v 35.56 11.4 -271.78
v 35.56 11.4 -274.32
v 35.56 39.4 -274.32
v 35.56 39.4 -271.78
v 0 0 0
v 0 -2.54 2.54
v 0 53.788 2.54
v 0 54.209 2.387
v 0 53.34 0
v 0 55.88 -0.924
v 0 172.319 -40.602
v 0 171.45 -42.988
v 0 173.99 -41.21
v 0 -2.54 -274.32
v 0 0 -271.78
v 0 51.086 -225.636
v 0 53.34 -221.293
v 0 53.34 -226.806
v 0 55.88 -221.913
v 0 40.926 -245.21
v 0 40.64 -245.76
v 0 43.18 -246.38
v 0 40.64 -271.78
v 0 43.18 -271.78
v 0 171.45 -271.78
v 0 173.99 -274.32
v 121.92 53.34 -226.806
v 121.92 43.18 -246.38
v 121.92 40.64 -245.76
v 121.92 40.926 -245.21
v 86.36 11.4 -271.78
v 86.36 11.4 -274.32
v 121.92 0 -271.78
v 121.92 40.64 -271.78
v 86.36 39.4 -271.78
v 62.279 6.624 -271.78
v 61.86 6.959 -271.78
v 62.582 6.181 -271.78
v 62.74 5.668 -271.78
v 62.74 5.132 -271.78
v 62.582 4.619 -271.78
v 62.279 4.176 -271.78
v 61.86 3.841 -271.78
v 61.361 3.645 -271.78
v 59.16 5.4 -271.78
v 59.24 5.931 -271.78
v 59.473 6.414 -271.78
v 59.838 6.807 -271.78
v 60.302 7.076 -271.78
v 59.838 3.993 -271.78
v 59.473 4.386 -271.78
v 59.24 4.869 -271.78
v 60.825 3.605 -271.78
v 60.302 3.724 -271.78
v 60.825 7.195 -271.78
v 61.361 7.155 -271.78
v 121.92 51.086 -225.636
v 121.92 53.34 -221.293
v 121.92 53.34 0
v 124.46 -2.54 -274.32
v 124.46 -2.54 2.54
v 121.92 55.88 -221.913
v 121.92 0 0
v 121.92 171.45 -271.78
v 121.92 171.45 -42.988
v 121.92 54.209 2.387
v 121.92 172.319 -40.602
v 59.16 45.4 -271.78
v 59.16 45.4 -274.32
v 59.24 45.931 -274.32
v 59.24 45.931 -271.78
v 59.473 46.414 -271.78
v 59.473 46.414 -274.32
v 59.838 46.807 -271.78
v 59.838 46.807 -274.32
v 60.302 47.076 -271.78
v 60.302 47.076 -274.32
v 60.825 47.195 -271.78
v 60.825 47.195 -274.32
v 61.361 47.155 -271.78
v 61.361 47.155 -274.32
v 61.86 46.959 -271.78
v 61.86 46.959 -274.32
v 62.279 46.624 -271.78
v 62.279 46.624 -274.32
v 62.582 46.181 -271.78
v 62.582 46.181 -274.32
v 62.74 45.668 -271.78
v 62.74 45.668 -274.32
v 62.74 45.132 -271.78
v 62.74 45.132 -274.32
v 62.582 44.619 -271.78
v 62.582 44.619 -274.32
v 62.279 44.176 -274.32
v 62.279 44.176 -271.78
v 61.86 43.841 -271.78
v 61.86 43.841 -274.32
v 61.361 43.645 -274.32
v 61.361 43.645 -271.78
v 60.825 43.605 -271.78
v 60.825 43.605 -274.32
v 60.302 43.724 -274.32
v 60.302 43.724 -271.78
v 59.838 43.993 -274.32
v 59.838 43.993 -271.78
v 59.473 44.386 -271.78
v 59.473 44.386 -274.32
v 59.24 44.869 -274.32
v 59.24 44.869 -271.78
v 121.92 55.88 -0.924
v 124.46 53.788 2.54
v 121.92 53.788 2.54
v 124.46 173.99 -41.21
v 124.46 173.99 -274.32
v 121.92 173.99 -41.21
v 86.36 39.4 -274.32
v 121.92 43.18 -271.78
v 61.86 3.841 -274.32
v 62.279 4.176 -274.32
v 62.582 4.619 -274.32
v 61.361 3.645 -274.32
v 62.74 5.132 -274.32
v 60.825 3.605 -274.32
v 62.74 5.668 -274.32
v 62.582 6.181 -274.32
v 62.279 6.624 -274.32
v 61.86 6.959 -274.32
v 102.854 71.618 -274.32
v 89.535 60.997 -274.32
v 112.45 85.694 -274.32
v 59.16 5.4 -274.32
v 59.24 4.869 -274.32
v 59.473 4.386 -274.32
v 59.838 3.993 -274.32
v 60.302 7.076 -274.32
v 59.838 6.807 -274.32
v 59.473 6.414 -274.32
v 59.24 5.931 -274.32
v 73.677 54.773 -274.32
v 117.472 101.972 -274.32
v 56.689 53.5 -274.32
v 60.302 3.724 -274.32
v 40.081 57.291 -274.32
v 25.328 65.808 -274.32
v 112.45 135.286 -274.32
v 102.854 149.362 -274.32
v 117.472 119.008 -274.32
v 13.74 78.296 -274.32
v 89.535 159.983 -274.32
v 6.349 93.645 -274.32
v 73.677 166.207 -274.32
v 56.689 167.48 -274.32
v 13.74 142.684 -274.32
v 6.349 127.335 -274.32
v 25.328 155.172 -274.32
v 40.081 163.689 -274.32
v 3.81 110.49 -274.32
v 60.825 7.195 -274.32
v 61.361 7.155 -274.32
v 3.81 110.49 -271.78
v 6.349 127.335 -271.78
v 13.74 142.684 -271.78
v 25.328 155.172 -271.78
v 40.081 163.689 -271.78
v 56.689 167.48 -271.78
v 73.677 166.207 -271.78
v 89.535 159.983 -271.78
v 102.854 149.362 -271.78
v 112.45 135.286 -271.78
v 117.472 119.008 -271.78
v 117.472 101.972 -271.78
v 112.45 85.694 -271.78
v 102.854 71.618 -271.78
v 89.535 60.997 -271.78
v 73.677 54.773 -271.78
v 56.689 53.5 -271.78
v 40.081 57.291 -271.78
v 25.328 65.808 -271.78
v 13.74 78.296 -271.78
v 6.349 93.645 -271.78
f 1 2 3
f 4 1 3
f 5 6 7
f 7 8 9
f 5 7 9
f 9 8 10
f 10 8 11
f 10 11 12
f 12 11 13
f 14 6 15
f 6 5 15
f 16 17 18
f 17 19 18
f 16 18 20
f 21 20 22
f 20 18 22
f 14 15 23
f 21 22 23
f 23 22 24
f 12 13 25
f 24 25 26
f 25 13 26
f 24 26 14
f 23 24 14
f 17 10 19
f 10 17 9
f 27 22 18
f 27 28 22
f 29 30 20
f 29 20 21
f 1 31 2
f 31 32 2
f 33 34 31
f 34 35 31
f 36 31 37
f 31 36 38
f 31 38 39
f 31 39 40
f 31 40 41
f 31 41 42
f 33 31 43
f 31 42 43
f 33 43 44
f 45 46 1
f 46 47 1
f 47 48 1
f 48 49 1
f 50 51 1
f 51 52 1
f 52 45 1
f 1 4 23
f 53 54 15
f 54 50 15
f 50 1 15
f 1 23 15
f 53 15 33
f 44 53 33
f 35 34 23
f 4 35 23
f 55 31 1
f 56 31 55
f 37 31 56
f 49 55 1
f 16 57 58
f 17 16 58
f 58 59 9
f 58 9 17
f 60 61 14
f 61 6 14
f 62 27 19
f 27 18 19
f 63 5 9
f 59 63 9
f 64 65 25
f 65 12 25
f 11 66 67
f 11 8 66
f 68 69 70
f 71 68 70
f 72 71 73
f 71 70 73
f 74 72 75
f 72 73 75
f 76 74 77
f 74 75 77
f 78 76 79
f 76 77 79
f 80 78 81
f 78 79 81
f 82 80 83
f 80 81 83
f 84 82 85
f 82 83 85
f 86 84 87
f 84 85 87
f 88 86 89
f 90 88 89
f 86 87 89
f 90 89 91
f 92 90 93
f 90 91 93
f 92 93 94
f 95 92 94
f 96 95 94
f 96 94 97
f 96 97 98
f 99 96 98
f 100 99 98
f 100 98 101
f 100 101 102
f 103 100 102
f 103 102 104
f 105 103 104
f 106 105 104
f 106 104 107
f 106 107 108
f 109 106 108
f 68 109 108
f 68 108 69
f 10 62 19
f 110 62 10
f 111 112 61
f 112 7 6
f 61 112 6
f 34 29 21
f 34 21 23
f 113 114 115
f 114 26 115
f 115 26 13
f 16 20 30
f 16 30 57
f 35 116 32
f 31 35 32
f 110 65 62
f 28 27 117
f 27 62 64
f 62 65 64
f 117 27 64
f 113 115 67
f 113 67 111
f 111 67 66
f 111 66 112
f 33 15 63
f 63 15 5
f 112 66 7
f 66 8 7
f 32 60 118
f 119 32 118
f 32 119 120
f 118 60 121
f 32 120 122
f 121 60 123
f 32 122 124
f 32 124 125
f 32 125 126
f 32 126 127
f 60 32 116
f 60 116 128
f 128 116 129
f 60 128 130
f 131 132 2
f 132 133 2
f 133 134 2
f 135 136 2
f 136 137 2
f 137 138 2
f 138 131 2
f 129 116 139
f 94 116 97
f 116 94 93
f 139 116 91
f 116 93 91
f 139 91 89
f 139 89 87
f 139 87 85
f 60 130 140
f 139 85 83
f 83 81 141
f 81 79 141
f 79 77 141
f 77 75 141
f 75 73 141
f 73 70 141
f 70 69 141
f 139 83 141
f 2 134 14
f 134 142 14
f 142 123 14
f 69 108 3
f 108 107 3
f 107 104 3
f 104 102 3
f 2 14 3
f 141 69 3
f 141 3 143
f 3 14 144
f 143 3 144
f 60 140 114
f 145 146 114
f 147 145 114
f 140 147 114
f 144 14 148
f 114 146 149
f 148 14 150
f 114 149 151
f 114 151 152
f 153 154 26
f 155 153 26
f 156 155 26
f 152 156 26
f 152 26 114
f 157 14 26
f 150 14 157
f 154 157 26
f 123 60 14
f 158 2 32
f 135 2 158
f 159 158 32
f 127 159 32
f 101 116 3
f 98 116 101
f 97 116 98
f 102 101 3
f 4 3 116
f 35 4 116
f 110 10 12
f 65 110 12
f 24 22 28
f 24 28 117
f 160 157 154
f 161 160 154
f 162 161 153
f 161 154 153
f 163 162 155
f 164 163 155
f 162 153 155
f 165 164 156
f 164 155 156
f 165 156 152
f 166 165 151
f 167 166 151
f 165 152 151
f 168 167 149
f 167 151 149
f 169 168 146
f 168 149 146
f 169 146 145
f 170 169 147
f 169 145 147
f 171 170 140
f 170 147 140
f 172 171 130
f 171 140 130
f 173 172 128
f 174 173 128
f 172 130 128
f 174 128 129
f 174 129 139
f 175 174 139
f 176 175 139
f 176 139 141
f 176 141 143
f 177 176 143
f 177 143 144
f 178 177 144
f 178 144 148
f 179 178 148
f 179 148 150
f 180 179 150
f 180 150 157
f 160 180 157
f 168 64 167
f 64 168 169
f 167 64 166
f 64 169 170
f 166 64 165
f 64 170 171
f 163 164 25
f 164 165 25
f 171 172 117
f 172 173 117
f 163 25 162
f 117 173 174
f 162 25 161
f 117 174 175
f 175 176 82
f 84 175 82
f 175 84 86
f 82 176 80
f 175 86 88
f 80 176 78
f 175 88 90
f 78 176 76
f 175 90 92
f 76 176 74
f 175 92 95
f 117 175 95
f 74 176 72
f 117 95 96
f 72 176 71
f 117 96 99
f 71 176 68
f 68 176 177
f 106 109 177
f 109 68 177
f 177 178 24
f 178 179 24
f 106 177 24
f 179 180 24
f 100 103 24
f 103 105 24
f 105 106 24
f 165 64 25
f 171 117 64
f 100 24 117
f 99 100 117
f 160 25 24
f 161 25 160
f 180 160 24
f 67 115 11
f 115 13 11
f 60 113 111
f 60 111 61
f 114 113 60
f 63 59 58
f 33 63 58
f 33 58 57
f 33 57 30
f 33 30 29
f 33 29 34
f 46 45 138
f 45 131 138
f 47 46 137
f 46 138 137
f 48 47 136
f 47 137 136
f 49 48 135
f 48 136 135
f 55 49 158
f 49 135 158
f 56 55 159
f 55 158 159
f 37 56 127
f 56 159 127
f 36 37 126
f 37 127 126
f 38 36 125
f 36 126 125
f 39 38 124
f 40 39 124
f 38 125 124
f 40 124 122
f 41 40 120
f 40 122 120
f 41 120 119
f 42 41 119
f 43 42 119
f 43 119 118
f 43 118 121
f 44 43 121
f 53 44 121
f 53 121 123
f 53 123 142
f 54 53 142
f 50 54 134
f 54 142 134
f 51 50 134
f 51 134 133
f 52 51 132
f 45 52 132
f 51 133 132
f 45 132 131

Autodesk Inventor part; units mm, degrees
ref_plane "YZ Plane" through (0, 0, 0) normal (1, 0, 0) x (0, 1, 0)
ref_plane "XZ Plane" through (0, 0, 0) normal (0, 1, 0) x (-1, 0, 0)
ref_plane "XY Plane" through (0, 0, 0) normal (0, 0, 1) x (1, 0, 0)
sketch "Sketch1" plane through (0, 0, 0) normal (1, 0, 0) x (0, 1, 0)
  line L0 (0, 0) -> (171.45, 0)
  line L1 (171.45, 0) -> (171.45, -271.78)
  line L2 (171.45, -271.78) -> (0, -271.78)
  line L3 (0, -271.78) -> (0, 0)
  line L4 (0, 0) -> (53.34, 0)
  line L5 (53.34, 0) -> (53.34, -271.78)
  line L6 (53.34, 0) -> (171.45, -42.9885)
  line L7 (53.34, 0) -> (179.03, 0) construction
  line L8 (173.99, -274.32) -> (173.99, 2.54)
  line L9 (173.99, 2.54) -> (-2.54, 2.54)
  line L10 (-2.54, 2.54) -> (-2.54, -274.32)
  line L11 (-2.54, -274.32) -> (173.99, -274.32)
  line L12 (54.2087, 2.3868) -> (172.3187, -40.6017)
  line L13 (179.03, -43.0444) -> (43.4558, 6.3006)
  point P0 (53.7879, 2.54)
  point P1 (173.99, -41.21)
  dimension "d0" = 171.45
  dimension "d1" = 271.78
  dimension "d2" = 53.34
  dimension "d3" = 20
  dimension "d4" = 2.54
  dimension "d5" = 2.54
extrude "Extrusion1" add sketch "Sketch1" along normal blind 121.92 contours L3 L2 L1 L12 L13 L8 L11 L10 L9 L0 | L0 L12 L1 L6
sketch "Sketch2" plane through (121.92, 0, 0) normal (1, 0, 0) x (0, 0, -1)
  line L0 (0, 0) -> (0, 53.34) projected
  line L1 (0, 53.34) -> (271.78, 53.34)
  line L2 (271.78, 171.45) -> (271.78, 0) projected
  line L3 (271.78, 55.88) -> (-2.54, 55.88)
  line L4 (-2.54, 55.88) -> (-2.54, 0)
  line L5 (0, 53.34) -> (42.9885, 171.45) projected
  line L6 (5.0738, 67.2802) -> (-1.6206, 48.8875)
  line L7 (271.78, 82.1996) -> (271.78, 27.94)
  point P0 (0.9245, 55.88)
  dimension "d8" = 2.54
extrude "Extrusion2" add sketch "Sketch2" against normal blind 121.92
sketch "Sketch3" plane through (0, -2.54, -274.32) normal (0, 0, -1) x (-1, 0, 0)
  line L0 (0, 0) -> (-121.92, 0) projected
  line L1 (-121.92, 0) -> (0, 0)
  line L2 (-121.92, 55.88) -> (0, 55.88) projected
  line L3 (0, 0) -> (0, 55.88)
  line L4 (0, 55.88) -> (-121.92, 55.88)
  line L5 (0, 58.42) -> (-121.92, 58.42) projected
  line L6 (-121.92, 55.88) -> (-121.92, 0)
  circle A0 centre (-60.96, 27.94) radius 27.94
  line L7 (-83.46, 13.94) -> (-38.46, 13.94)
  line L8 (-38.46, 13.94) -> (-38.46, 41.94)
  line L9 (-38.46, 41.94) -> (-83.46, 41.94)
  line L10 (-83.46, 41.94) -> (-83.46, 13.94)
  line L11 (-83.46, 13.94) -> (-38.46, 41.94) construction
  line L12 (-38.46, 13.94) -> (-83.46, 41.94) construction
  line L13 (-60.9761, 7.94) -> (-60.9439, 7.94)
  line L14 (-60.9439, 47.94) -> (-60.9761, 47.94)
  line L15 (-60.9761, 7.94) -> (-60.9439, 47.94) construction
  line L16 (-60.9439, 7.94) -> (-60.9761, 47.94) construction
  circle A1 centre (-60.96, 47.94) radius 1.8
  circle A2 centre (-60.96, 7.94) radius 1.8
  line L17 (-60.9761, 47.94) -> (-60.9761, 46.1401)
  line L18 (-60.9439, 46.1401) -> (-60.9439, 47.94)
  line L19 (-60.9761, 41.94) -> (-60.9761, 13.94)
  line L20 (-60.9761, 9.7399) -> (-60.9761, 7.94)
  line L21 (-60.9439, 7.94) -> (-60.9439, 9.7399)
  line L22 (-60.9439, 13.94) -> (-60.9439, 41.94)
  point P0 (0, 2.54)
  dimension "d11" = 45
  dimension "d12" = 28
  dimension "d13" = 40
  dimension "d14" = 3.6
extrude "Extrusion3" cut sketch "Sketch3" against normal blind 121.92 contours L10 L9 L19 L7 | L19 L9 L22 L7 | L22 L9 L8 L7 | L20 A2 L21 L13 | L13 L21 A2 L20 | L18 A1 L17 L14 | L14 L17 A1 L18
sketch "Sketch4" plane through (0, -2.54, -274.32) normal (0, 0, -1) x (-1, 0, 0)
  line L0 (-38.46, 41.94) -> (-38.46, 13.94) projected
  line L1 (-83.46, 13.94) -> (-83.46, 41.94) projected
  line L2 (-38.46, 41.94) -> (-83.46, 41.94)
  line L3 (-83.46, 41.94) -> (-83.46, 13.94)
  line L4 (-83.46, 13.94) -> (-38.46, 13.94)
  line L5 (-38.46, 13.94) -> (-38.46, 41.94)
  line L6 (-86.36, 13.94) -> (-35.56, 13.94)
  line L7 (-35.56, 13.94) -> (-35.56, 41.94)
  line L8 (-35.56, 41.94) -> (-86.36, 41.94)
  line L9 (-86.36, 41.94) -> (-86.36, 13.94)
  line L10 (-86.36, 13.94) -> (-35.56, 41.94) construction
  line L11 (-35.56, 13.94) -> (-86.36, 41.94) construction
  point P0 (0, 2.54)
  point P1 (-60.96, 27.94)
  dimension "d17" = 50.8
extrude "Extrusion4" cut sketch "Sketch4" against normal blind 121.92 contours L8 L7 L6 L0 | L1 L6 L9 L8
sketch "Sketch5" plane through (121.92, 0, 0) normal (1, 0, 0) x (0, 0, -1)
  line L0 (271.78, 53.34) -> (271.78, 0) projected
  line L1 (271.78, 53.34) -> (246.38, 53.34)
  line L2 (271.78, 53.34) -> (0, 53.34) projected
  line L3 (246.38, 53.34) -> (246.38, 43.18)
  line L4 (246.38, 43.18) -> (272.1958, 43.18)
  line L5 (246.38, 43.18) -> (226.8063, 53.34)
  line L6 (226.8063, 53.34) -> (209.4202, 62.3644)
  line L7 (245.2098, 40.9256) -> (225.6361, 51.0856)
  line L8 (225.6361, 51.0856) -> (208.25, 60.1101)
  line L9 (246.38, 40.64) -> (272.1958, 40.64)
  line L10 (239.3965, 43.9431) -> (259.2879, 33.6182)
  line L11 (267.1647, 40.64) -> (232.6379, 40.64)
  point P0 (0, 0)
  point P1 (245.7601, 40.64)
  point P2 (271.78, 40.64)
  point P3 (271.78, 43.18)
  point P4 (221.2929, 53.34)
  dimension "d20" = 25.4
  dimension "d21" = 10.16
  dimension "d22" = 2.54
  dimension "d23" = 2.54
extrude "Extrusion5" add sketch "Sketch5" against normal blind 121.92 contours L0 L9 L11 L10 L7 L8 L2 L5 L4
sketch "Sketch6" plane through (0, 0, 0) normal (-1, 0, 0) x (0, 0, 1)
  line L0 (-226.8063, 53.34) -> (-246.38, 43.18) projected
  line L1 (-233.7398, 49.741) -> (-197.786, 68.4033)
  line L2 (-197.786, 68.4033) -> (-271.78, 69.3117)
  line L3 (-271.78, 171.45) -> (-271.78, 55.88) projected
  line L4 (-271.78, 69.3117) -> (-271.78, 47.3341)
  line L5 (-271.78, 53.34) -> (-271.78, 43.18) projected
  line L6 (-271.78, 47.3341) -> (-233.7398, 49.741)
  point P0 (0, 0)
extrude "Extrusion6" cut sketch "Sketch6" against normal blind 121.92
sketch "Sketch7" plane through (121.92, 0, 0) normal (1, 0, 0) x (0, 0, -1)
  line L0 (-2.54, -2.54) -> (274.32, -2.54) projected
  line L1 (274.32, 173.99) -> (41.21, 173.99) projected
  line L2 (-2.54, -2.54) -> (274.32, -2.54)
  line L3 (274.32, -2.54) -> (274.32, 173.99)
  line L4 (274.32, 173.99) -> (-2.54, 173.99)
  line L5 (-2.54, 173.99) -> (-2.54, -2.54)
  line L6 (41.21, 173.99) -> (-2.54, 53.7879) projected
  line L7 (41.21, 173.99) -> (-2.54, 53.7879)
  point P0 (0, 0)
extrude "Extrusion7" add sketch "Sketch7" along normal blind 2.54 contours L5 L6 L1 L3 L0
sketch "Sketch8" plane through (0, -2.54, -274.32) normal (0, 0, -1) x (-1, 0, 0)
  line L0 (0, 173.99) -> (-121.92, 173.99) projected
  line L1 (-121.92, 173.99) -> (0, 173.99)
  line L2 (0, 173.99) -> (0, 52.07)
  line L3 (0, 52.07) -> (-121.92, 52.07)
  line L4 (-121.92, 52.07) -> (-121.92, 173.99)
  circle A0 centre (-60.96, 113.03) radius 57.15
  point P0 (0, 2.54)
  dimension "d30" = 121.92
  dimension "d31" = 114.3
extrude "Extrusion8" cut sketch "Sketch8" against normal blind 25.4 contours A0
properties part number "Electronics Case for Bubba"
